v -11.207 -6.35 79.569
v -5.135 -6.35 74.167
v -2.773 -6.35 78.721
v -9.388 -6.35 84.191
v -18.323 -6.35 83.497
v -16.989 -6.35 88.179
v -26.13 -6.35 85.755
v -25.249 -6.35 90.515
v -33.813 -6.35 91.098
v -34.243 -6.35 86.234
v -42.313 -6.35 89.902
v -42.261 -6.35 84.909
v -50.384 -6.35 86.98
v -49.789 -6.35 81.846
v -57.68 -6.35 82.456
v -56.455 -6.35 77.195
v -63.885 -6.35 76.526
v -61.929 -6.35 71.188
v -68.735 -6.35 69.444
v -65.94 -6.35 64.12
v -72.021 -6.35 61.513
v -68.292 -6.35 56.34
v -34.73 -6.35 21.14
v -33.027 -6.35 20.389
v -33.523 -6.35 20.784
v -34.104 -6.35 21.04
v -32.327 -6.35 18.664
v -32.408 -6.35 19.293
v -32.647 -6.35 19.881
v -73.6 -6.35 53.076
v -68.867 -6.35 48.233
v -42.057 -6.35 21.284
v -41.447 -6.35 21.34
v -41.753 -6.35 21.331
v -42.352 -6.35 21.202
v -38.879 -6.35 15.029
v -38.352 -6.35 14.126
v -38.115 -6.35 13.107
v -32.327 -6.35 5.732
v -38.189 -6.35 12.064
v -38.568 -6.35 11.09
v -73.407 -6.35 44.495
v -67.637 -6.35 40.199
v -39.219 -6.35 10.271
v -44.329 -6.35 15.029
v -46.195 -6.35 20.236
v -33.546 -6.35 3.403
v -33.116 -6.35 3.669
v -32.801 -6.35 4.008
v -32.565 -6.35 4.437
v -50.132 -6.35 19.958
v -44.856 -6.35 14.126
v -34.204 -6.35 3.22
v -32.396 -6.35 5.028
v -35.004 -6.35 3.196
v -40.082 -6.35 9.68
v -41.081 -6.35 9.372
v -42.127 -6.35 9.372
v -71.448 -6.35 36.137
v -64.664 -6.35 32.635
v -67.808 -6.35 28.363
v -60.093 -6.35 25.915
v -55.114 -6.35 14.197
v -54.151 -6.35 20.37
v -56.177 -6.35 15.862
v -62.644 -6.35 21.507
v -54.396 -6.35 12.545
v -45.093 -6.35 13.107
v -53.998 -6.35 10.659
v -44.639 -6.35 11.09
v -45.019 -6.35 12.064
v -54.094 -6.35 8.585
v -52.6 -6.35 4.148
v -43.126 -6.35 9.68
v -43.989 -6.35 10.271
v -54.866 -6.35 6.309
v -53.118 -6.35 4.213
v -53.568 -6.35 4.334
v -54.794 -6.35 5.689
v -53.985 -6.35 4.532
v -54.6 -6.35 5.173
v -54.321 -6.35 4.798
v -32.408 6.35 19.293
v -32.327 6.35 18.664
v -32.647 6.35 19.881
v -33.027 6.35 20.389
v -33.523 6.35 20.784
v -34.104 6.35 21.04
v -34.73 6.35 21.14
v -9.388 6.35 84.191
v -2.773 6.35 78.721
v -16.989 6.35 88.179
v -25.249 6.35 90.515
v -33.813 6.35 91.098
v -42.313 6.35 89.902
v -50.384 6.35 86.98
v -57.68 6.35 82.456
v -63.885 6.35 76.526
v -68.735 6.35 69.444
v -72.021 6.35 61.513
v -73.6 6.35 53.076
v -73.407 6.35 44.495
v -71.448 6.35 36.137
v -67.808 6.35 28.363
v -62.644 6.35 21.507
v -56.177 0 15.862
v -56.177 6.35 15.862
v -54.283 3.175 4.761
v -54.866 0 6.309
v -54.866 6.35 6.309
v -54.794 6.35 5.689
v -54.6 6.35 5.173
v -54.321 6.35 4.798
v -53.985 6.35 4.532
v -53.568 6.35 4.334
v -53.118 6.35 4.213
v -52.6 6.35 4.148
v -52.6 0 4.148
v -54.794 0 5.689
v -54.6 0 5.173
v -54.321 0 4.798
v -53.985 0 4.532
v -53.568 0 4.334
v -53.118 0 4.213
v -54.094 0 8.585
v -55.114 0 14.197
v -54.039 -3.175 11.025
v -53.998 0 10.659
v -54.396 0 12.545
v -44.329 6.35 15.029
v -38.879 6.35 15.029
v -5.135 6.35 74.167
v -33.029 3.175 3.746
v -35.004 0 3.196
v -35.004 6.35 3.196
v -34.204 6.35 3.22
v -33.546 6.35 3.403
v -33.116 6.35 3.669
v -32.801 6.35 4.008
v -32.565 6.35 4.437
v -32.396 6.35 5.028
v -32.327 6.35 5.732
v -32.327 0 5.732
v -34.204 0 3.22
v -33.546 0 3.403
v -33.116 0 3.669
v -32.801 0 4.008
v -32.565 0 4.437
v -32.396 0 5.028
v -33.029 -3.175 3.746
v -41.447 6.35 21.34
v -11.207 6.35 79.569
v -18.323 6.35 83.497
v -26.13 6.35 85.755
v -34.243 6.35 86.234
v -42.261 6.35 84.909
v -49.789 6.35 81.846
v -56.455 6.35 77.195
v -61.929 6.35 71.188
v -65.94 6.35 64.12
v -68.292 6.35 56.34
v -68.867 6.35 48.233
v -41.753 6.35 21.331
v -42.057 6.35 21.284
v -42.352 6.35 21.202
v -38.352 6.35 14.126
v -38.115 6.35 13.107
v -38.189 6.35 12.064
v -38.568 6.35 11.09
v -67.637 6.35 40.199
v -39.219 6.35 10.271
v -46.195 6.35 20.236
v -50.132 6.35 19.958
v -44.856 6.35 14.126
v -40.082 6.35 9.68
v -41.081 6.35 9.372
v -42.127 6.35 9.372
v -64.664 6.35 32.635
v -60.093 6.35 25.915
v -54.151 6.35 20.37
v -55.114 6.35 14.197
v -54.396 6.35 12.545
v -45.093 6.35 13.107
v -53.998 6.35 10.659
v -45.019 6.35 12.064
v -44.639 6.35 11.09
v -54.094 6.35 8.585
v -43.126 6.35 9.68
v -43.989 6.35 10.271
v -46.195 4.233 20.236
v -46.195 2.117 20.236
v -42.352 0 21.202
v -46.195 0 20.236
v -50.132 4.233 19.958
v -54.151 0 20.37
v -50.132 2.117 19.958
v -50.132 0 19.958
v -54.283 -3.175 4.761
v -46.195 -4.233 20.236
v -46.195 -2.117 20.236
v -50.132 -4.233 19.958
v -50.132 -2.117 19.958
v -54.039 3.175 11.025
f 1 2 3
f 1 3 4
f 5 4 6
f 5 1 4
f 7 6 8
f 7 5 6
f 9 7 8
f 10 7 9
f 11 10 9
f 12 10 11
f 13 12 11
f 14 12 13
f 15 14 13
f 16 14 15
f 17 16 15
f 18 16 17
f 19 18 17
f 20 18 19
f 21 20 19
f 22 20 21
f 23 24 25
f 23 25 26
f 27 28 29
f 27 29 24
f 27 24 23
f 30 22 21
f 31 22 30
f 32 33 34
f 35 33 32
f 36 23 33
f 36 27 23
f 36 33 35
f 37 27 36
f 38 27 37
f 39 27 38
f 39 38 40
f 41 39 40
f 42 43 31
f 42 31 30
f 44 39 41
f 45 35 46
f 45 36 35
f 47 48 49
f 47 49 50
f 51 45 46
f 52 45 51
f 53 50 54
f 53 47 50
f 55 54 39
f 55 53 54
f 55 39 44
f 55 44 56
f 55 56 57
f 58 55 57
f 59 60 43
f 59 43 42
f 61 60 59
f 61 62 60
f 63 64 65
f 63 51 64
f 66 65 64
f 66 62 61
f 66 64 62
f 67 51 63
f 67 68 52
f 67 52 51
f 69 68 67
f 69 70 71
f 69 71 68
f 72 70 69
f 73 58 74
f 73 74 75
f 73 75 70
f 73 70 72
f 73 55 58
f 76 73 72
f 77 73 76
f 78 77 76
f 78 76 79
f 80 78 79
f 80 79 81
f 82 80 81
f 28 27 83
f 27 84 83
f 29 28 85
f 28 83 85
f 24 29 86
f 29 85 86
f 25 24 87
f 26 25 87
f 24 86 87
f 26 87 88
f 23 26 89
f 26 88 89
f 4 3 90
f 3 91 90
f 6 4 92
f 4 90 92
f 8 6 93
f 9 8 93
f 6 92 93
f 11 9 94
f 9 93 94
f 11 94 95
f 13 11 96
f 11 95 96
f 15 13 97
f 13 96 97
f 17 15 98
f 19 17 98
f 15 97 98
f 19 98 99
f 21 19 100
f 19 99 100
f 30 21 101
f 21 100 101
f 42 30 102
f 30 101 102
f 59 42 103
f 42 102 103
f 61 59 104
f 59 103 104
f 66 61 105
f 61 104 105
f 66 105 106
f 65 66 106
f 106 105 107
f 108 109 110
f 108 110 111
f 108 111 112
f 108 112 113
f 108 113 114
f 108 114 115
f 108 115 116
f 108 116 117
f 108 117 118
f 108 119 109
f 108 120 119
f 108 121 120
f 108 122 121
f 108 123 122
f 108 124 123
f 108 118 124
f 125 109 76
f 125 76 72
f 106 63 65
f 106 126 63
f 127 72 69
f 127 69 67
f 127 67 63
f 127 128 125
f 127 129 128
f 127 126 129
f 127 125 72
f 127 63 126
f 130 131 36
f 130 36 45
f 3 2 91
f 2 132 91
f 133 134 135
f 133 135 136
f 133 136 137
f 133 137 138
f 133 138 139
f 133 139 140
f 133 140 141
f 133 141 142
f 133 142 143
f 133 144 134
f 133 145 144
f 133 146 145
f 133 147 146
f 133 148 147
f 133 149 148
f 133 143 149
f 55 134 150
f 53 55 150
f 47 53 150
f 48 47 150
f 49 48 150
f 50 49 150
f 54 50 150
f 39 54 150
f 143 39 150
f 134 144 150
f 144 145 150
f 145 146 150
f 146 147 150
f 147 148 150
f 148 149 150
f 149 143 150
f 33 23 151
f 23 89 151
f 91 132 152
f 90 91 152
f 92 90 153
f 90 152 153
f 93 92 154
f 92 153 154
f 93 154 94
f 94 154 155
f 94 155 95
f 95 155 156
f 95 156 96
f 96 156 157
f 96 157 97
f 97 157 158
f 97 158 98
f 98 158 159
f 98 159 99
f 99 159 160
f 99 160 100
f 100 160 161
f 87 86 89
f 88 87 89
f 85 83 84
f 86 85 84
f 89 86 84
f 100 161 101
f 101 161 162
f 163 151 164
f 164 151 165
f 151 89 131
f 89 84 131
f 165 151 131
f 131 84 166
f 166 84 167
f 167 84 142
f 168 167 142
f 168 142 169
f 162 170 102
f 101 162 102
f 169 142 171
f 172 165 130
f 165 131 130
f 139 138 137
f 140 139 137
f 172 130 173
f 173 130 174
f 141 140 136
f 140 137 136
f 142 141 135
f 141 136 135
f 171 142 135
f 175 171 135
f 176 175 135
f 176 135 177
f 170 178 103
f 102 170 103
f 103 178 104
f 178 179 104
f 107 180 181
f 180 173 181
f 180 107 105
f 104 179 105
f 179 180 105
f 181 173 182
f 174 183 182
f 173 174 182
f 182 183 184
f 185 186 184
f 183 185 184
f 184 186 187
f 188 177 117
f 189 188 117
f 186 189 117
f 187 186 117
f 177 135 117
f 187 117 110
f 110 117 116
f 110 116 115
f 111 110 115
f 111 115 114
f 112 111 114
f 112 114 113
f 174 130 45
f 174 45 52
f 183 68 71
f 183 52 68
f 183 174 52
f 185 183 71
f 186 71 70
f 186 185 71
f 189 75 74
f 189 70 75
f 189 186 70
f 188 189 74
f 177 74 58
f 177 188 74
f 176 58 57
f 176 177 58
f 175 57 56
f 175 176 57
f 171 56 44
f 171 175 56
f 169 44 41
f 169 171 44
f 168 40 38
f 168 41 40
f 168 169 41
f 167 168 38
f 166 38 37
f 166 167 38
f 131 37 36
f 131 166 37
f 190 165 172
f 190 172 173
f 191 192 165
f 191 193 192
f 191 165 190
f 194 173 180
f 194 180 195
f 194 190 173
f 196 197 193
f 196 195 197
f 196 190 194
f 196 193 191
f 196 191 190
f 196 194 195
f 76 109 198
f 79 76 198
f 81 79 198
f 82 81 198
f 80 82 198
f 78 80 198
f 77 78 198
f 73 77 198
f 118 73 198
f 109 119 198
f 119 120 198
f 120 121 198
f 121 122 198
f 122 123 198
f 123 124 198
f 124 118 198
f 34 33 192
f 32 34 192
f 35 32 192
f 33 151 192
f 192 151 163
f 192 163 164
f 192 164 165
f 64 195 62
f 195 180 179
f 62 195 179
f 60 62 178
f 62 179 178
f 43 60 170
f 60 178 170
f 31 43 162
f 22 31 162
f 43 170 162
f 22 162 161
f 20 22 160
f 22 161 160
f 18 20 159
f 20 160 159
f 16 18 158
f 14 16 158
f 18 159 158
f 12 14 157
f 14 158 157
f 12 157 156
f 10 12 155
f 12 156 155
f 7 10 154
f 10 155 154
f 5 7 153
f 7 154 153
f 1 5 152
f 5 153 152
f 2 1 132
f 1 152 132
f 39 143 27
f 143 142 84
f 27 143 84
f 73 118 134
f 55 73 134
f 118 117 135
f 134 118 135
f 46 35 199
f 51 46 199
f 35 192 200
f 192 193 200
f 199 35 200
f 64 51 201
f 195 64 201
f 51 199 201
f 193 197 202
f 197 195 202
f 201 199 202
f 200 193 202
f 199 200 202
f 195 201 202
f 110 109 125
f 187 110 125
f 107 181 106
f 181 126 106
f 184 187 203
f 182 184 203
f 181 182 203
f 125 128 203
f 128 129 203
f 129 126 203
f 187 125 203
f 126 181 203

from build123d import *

# Parameters (mm, degrees)
BOSS_EXTRUDE2_DEPTH     = 6.35
CUT_EXTRUDE1_DEPTH      = 0.254
CUT_EXTRUDE1_DEPTH_BACK = 13.208


with BuildPart() as part:
    # Sketch3 → Boss-Extrude2 (new, symmetric)
    with BuildSketch(Plane(origin=(0, 0, 0), x_dir=(1, 0, 0), z_dir=(0, 1, 0))):
        with BuildLine():
            Line((-52.600480424, -4.148495284), (-35.004351305, -3.195671149))
            add(Edge.make_bspline(
                [(-35.004351305, -3.195671149), (-32.391383355, -3.02906189), (-32.327012412, -5.731955445)],
                knots=[0, 0, 0, 1, 1, 1], degree=2))
            Line((-32.327012412, -5.731955445), (-32.327012412, -18.663867238))
            ThreePointArc((-32.327012412, -18.663867238), (-33.026692388, -20.3892504), (-34.730486544, -21.139973114))
            Line((-34.730486544, -21.139973114), (-41.447053807, -21.339967417))
            ThreePointArc((-41.447053807, -21.339967417), (-41.905677943, -21.312046914), (-42.351768326, -21.201960476))
            add(Edge.make_bspline(
                [(-42.351768326, -21.201960476), (-46.143088768, -19.892664891), (-50.094878971, -19.611768994), (-54.151069137, -20.370220418)],
                knots=[0.036271326, 0.036271326, 0.036271326, 0.036271326, 1, 1, 1, 1], degree=3))
            ThreePointArc((-54.151069137, -20.370220418), (-59.359137989, -74.344180893), (-5.134779033, -74.167301495))
            Line((-5.134779033, -74.167301495), (-2.773203125, -78.720626621))
            ThreePointArc((-2.773203125, -78.720626621), (-63.885313617, -76.526016755), (-56.177196586, -15.862260746))
            add(Edge.make_bspline(
                [(-54.866343349, -6.308912993), (-52.55640985, -10.963519078), (-56.177196586, -15.862260746)],
                knots=[0, 0, 0, 1, 1, 1], degree=2))
            add(Edge.make_bspline(
                [(-54.866343349, -6.308912993), (-54.833497461, -4.293658489), (-52.600480424, -4.148495284)],
                knots=[0, 0, 0, 1, 1, 1], degree=2))
        make_face()
    extrude(amount=BOSS_EXTRUDE2_DEPTH, both=True)

    # Sketch11 → Cut-Extrude1 (cut, two sides: drawn at the far end of the back side and taken through both)
    with BuildSketch(Plane(origin=(0, -6.35, 0), x_dir=(-1, 0, 0), z_dir=(0, -1, 0)).offset(-CUT_EXTRUDE1_DEPTH_BACK)):
        with BuildLine():
            Line((38.879229539, -15.029066428), (44.328612102, -15.029066428))
            ThreePointArc((44.328612102, -15.029066428), (41.603920821, -9.332237481), (38.879229539, -15.029066428))
        make_face()
    extrude(amount=CUT_EXTRUDE1_DEPTH + CUT_EXTRUDE1_DEPTH_BACK, mode=Mode.SUBTRACT)


solid = part.part
